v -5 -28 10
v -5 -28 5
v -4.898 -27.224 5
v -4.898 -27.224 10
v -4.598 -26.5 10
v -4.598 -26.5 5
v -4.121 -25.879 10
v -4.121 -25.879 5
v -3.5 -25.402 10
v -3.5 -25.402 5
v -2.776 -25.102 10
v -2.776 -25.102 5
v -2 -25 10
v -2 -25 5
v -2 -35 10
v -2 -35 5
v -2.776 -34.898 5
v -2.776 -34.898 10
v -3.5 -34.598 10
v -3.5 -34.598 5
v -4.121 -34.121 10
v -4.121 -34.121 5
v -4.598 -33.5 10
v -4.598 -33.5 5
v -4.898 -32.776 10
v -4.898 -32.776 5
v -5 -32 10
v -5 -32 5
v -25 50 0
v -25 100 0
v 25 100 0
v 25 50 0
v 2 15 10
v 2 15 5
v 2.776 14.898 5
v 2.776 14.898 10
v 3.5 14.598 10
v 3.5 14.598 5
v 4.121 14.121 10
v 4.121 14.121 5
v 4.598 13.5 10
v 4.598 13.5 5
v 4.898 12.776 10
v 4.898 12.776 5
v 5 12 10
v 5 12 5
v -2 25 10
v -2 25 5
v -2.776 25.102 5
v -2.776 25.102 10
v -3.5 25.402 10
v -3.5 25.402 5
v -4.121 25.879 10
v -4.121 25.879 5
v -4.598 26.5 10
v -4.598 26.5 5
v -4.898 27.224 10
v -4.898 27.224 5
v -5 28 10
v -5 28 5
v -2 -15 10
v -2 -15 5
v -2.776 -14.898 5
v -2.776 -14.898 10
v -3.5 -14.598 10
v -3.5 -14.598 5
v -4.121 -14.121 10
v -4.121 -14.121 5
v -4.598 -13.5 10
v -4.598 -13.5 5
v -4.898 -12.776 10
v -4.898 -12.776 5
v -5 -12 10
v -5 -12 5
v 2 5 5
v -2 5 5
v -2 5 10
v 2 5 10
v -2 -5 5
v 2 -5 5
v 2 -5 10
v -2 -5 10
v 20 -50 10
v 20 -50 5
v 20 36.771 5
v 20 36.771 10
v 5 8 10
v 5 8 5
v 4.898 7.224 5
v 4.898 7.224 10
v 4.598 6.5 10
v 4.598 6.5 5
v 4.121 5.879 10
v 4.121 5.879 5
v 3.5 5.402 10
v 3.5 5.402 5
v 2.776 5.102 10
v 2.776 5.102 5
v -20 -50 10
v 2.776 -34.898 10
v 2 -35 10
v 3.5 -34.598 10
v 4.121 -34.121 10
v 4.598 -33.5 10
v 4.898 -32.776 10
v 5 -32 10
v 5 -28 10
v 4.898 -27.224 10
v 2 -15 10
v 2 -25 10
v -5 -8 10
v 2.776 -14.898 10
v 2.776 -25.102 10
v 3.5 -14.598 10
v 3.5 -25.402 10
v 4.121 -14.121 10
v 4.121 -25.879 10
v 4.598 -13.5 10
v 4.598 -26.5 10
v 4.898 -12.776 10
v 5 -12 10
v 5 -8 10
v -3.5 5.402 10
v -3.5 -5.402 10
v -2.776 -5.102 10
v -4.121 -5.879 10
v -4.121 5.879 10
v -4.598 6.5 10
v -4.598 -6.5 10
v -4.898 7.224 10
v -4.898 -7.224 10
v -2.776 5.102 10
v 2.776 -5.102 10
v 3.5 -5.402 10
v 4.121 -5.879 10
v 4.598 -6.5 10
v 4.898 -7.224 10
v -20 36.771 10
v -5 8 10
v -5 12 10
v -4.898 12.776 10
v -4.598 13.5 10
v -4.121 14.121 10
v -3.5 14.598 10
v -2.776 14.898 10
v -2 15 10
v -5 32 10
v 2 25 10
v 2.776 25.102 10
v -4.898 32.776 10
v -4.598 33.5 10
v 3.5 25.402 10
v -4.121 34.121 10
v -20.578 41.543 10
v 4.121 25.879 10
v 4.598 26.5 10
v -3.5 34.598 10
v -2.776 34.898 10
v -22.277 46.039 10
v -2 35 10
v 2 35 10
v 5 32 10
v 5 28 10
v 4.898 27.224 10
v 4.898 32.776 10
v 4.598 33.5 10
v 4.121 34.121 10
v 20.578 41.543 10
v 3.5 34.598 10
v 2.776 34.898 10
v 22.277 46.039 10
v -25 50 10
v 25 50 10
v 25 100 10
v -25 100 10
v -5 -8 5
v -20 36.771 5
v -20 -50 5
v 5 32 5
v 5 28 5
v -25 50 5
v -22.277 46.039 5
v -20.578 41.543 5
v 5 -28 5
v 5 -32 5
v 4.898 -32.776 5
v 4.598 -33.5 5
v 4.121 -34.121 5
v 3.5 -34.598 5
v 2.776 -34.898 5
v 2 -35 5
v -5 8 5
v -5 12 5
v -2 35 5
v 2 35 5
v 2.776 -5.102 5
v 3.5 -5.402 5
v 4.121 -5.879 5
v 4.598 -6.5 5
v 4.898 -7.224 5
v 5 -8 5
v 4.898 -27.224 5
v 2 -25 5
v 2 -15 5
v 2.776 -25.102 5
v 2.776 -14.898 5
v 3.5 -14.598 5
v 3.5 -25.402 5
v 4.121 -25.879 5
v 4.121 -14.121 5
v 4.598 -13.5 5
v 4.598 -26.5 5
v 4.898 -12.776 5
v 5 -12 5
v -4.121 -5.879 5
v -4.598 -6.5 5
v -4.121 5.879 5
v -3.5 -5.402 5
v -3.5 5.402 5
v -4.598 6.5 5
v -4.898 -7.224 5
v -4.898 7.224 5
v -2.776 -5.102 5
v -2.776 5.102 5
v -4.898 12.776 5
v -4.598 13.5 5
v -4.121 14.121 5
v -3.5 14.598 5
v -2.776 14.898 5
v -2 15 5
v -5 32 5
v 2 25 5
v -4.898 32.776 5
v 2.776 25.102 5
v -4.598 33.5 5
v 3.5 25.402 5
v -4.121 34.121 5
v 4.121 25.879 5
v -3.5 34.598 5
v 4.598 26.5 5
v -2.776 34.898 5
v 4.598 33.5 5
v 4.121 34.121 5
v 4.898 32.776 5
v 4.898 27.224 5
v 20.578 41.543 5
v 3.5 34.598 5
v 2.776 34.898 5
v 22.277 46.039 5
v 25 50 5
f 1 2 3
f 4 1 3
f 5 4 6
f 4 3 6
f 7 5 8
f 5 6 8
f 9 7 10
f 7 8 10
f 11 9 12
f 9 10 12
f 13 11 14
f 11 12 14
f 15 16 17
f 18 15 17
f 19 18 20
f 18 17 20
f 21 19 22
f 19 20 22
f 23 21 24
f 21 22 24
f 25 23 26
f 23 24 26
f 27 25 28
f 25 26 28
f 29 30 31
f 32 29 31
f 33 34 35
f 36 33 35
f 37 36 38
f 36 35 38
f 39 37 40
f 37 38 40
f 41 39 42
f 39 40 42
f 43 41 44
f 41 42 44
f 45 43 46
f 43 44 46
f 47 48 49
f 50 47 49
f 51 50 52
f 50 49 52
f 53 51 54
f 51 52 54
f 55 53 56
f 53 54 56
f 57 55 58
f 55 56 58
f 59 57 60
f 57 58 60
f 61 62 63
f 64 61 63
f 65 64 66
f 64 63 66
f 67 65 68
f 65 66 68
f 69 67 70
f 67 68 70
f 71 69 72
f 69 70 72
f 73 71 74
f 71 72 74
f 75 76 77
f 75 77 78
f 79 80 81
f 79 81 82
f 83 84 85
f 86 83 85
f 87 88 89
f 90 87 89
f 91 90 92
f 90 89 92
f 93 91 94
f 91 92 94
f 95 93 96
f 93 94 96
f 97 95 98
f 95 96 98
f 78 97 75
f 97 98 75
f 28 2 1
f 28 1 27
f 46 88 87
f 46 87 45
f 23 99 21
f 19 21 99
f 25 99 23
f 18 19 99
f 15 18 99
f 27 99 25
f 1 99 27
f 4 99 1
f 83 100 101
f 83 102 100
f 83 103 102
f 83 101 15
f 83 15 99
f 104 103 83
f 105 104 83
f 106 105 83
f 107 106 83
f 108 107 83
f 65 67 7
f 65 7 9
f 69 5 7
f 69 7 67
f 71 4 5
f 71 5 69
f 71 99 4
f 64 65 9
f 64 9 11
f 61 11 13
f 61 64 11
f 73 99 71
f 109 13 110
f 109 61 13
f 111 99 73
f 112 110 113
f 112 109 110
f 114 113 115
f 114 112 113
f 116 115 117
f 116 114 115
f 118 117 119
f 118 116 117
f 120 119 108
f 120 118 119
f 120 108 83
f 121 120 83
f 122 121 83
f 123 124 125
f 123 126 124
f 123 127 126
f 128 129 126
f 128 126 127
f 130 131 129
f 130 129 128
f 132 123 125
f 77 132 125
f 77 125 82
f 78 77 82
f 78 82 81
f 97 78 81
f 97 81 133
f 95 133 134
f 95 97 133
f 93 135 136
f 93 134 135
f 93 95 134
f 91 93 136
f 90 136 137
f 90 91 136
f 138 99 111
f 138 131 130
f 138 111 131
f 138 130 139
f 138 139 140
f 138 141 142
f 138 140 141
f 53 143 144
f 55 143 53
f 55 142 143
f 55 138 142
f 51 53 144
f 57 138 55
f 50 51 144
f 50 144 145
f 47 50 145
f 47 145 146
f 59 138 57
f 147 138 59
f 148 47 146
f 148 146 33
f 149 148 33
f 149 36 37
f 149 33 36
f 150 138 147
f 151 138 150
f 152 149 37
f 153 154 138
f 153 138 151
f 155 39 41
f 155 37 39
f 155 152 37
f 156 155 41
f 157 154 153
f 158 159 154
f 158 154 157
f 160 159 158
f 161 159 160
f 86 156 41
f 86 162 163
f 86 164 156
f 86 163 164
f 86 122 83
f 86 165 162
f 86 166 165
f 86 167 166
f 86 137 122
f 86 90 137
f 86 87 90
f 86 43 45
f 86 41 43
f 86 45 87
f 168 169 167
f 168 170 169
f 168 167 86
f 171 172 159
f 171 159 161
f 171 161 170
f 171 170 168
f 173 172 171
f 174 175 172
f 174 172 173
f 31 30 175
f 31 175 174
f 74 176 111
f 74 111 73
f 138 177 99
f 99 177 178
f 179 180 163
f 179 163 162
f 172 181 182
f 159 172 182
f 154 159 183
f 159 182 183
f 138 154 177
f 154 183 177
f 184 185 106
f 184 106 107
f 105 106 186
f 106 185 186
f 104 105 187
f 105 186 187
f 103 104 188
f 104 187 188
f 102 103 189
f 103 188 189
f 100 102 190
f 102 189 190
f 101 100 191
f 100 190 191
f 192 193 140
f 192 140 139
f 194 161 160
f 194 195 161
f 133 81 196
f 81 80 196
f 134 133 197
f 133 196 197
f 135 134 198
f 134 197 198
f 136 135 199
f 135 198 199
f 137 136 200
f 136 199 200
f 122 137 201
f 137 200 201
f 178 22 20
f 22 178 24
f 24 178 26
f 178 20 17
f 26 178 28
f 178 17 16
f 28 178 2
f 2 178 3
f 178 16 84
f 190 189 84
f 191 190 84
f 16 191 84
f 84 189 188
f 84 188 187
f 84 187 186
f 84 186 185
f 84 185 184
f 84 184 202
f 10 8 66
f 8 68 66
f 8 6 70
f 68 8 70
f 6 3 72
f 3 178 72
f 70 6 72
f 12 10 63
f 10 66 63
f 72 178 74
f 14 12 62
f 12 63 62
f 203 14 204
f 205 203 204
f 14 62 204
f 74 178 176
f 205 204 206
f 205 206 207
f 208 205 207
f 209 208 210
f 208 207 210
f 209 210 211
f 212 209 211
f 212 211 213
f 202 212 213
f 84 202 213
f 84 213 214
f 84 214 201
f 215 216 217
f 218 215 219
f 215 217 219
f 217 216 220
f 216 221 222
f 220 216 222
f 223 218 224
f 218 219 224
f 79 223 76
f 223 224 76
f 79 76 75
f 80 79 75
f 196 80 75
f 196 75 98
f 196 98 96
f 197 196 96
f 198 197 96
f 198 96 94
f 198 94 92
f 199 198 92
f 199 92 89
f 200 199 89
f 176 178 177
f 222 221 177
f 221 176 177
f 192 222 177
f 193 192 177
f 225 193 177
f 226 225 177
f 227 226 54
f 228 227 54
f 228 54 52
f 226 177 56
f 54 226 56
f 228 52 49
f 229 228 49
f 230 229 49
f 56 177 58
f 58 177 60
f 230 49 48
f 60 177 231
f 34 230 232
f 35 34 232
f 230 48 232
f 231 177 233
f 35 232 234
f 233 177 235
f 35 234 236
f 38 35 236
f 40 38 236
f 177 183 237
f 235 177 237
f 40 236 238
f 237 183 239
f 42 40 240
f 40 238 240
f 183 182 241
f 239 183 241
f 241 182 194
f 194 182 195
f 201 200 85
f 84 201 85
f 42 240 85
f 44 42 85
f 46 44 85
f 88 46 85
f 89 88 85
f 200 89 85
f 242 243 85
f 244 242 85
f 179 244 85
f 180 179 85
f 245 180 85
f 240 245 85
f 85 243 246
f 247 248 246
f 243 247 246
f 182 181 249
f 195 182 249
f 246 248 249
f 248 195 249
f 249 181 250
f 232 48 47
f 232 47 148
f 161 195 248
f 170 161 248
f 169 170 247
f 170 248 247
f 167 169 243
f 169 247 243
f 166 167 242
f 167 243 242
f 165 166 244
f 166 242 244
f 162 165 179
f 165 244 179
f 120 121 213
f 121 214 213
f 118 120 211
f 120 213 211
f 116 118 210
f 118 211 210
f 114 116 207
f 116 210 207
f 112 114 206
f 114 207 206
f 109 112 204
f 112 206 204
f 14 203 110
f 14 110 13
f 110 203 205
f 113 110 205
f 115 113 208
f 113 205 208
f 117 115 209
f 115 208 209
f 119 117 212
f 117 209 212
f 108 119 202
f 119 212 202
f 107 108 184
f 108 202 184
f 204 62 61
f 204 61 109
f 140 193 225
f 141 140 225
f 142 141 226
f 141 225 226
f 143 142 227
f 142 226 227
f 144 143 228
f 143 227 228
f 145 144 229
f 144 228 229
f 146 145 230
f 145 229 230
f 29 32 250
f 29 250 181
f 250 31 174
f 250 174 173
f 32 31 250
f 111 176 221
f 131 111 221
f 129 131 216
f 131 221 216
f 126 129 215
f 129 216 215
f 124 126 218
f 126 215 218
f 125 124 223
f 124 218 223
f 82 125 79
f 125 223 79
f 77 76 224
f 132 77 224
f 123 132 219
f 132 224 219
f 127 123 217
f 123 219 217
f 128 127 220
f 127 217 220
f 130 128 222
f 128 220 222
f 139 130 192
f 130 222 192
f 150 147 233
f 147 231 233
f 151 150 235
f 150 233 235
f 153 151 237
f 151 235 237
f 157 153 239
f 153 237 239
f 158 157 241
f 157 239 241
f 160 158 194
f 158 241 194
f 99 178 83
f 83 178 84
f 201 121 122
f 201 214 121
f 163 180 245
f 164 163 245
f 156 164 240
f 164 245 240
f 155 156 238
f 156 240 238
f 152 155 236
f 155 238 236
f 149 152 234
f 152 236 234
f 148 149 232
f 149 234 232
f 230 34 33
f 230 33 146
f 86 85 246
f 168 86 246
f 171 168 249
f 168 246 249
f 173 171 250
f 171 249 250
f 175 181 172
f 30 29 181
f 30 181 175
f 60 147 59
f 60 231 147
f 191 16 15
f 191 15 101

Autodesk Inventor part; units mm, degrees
ref_plane "YZ Plane" through (0, 0, 0) normal (1, 0, 0) x (0, 1, 0)
ref_plane "XZ Plane" through (0, 0, 0) normal (0, 1, 0) x (-1, 0, 0)
ref_plane "XY Plane" through (0, 0, 0) normal (0, 0, 1) x (1, 0, 0)
sketch "Boceto1" plane through (0, 0, 0) normal (0, 0, 1) x (1, 0, 0)
  line L0 (-20, -50) -> (20, -50)
  line L1 (20, -50) -> (20, 50)
  line L2 (20, 50) -> (-20, 50)
  line L3 (-20, 50) -> (-20, -50)
  line L4 (-20, -50) -> (20, 50) construction
  line L5 (20, -50) -> (-20, 50) construction
  line L6 (-25, 100) -> (25, 100)
  line L7 (25, 100) -> (25, 50)
  line L8 (25, 50) -> (-25, 50)
  line L9 (-25, 50) -> (-25, 100)
  line L10 (-25, 100) -> (25, 50) construction
  line L11 (25, 100) -> (-25, 50) construction
  line L12 (-25, -50) -> (25, -50)
  line L13 (25, -50) -> (25, -100)
  line L14 (25, -100) -> (-25, -100)
  line L15 (-25, -100) -> (-25, -50)
  line L16 (-25, -50) -> (25, -100) construction
  line L17 (25, -50) -> (-25, -100) construction
  line L18 (0, 50) -> (0, 30) construction
  line L19 (0, 30) -> (0, 10) construction
  line L20 (0, 10) -> (0, -10) construction
  line L21 (0, -10) -> (0, -30) construction
  line L22 (0, -30) -> (0, -50) construction
  line L23 (0, 30) -> (0, 30) construction
  line L24 (0, 10) -> (0, 10) construction
  line L25 (0, -10) -> (0, -10) construction
  line L26 (0, -30) -> (0, -30) construction
  line L27 (2, 35) -> (-2, 35)
  line L28 (-5, 32) -> (-5, 28)
  line L29 (-2, 25) -> (2, 25)
  line L30 (5, 28) -> (5, 32)
  line L31 (5, 35) -> (-5, 25) construction
  line L32 (-5, 35) -> (5, 25) construction
  line L33 (2, 15) -> (-2, 15)
  line L34 (-5, 12) -> (-5, 8)
  line L35 (-2, 5) -> (2, 5)
  line L36 (5, 8) -> (5, 12)
  line L37 (5, 15) -> (-5, 5) construction
  line L38 (-5, 15) -> (5, 5) construction
  line L39 (2, -5) -> (-2, -5)
  line L40 (-5, -8) -> (-5, -12)
  line L41 (-2, -15) -> (2, -15)
  line L42 (5, -12) -> (5, -8)
  line L43 (5, -5) -> (-5, -15) construction
  line L44 (-5, -5) -> (5, -15) construction
  line L45 (2, -25) -> (-2, -25)
  line L46 (-5, -28) -> (-5, -32)
  line L47 (-2, -35) -> (2, -35)
  line L48 (5, -32) -> (5, -28)
  line L49 (5, -25) -> (-5, -35) construction
  line L50 (-5, -25) -> (5, -35) construction
  line L51 (0, 30) -> (0, 10) construction
  arc A0 (-2, 35) -> (-5, 32) centre (-2, 32) ccw
  arc A1 (5, 32) -> (2, 35) centre (2, 32) ccw
  arc A2 (2, 25) -> (5, 28) centre (2, 28) ccw
  arc A3 (-5, 28) -> (-2, 25) centre (-2, 28) ccw
  arc A4 (-2, 15) -> (-5, 12) centre (-2, 12) ccw
  arc A5 (-5, 8) -> (-2, 5) centre (-2, 8) ccw
  arc A6 (2, 5) -> (5, 8) centre (2, 8) ccw
  arc A7 (5, 12) -> (2, 15) centre (2, 12) ccw
  arc A8 (5, -8) -> (2, -5) centre (2, -8) ccw
  arc A9 (-2, -5) -> (-5, -8) centre (-2, -8) ccw
  arc A10 (-5, -12) -> (-2, -15) centre (-2, -12) ccw
  arc A11 (2, -15) -> (5, -12) centre (2, -12) ccw
  arc A12 (5, -28) -> (2, -25) centre (2, -28) ccw
  arc A13 (2, -35) -> (5, -32) centre (2, -32) ccw
  arc A14 (-5, -32) -> (-2, -35) centre (-2, -32) ccw
  arc A15 (-2, -25) -> (-5, -28) centre (-2, -28) ccw
  point P0 (0, 0)
  point P1 (0, 75)
  point P2 (0, -75)
  dimension "d0" = 40
  dimension "d1" = 100
  dimension "d2" = 50
  dimension "d3" = 50
  dimension "d4" = 50
  dimension "d5" = 50
  dimension "d6" = 20
  dimension "d7" = 20
  dimension "d8" = 20
  dimension "d9" = 20
  dimension "d10" = 0
  dimension "d11" = 0
  dimension "d12" = 0
  dimension "d13" = 0
  dimension "d25" = 10
  dimension "d26" = 10
  dimension "d27" = 10
  dimension "d28" = 10
  dimension "d29" = 10
  dimension "d30" = 10
  dimension "d31" = 10
  dimension "d32" = 10
  dimension "d33" = 20
  dimension "d34" = 3
extrude "Extrusión1" add sketch "Boceto1" along normal blind 10 contours L3 L2 L1 L0 | L8 L9 L6 L7 L2
extrude "Extrusión2" cut sketch "Boceto1" along normal blind 5 contours L3 L2 L1 L0 | A1 L30 A2 L29 A3 L28 A0 L27 | A7 L36 A6 L35 A5 L34 A4 L33 | A8 L42 A11 L41 A10 L40 A9 L39 | A12 L48 A13 L47 A14 L46 A15 L45
fillet "Empalme3" radius 20 2 edges at (20, 50, 7.5) (-20, 50, 7.5)
properties material "MDF Tablero de fibras de densidad media"
